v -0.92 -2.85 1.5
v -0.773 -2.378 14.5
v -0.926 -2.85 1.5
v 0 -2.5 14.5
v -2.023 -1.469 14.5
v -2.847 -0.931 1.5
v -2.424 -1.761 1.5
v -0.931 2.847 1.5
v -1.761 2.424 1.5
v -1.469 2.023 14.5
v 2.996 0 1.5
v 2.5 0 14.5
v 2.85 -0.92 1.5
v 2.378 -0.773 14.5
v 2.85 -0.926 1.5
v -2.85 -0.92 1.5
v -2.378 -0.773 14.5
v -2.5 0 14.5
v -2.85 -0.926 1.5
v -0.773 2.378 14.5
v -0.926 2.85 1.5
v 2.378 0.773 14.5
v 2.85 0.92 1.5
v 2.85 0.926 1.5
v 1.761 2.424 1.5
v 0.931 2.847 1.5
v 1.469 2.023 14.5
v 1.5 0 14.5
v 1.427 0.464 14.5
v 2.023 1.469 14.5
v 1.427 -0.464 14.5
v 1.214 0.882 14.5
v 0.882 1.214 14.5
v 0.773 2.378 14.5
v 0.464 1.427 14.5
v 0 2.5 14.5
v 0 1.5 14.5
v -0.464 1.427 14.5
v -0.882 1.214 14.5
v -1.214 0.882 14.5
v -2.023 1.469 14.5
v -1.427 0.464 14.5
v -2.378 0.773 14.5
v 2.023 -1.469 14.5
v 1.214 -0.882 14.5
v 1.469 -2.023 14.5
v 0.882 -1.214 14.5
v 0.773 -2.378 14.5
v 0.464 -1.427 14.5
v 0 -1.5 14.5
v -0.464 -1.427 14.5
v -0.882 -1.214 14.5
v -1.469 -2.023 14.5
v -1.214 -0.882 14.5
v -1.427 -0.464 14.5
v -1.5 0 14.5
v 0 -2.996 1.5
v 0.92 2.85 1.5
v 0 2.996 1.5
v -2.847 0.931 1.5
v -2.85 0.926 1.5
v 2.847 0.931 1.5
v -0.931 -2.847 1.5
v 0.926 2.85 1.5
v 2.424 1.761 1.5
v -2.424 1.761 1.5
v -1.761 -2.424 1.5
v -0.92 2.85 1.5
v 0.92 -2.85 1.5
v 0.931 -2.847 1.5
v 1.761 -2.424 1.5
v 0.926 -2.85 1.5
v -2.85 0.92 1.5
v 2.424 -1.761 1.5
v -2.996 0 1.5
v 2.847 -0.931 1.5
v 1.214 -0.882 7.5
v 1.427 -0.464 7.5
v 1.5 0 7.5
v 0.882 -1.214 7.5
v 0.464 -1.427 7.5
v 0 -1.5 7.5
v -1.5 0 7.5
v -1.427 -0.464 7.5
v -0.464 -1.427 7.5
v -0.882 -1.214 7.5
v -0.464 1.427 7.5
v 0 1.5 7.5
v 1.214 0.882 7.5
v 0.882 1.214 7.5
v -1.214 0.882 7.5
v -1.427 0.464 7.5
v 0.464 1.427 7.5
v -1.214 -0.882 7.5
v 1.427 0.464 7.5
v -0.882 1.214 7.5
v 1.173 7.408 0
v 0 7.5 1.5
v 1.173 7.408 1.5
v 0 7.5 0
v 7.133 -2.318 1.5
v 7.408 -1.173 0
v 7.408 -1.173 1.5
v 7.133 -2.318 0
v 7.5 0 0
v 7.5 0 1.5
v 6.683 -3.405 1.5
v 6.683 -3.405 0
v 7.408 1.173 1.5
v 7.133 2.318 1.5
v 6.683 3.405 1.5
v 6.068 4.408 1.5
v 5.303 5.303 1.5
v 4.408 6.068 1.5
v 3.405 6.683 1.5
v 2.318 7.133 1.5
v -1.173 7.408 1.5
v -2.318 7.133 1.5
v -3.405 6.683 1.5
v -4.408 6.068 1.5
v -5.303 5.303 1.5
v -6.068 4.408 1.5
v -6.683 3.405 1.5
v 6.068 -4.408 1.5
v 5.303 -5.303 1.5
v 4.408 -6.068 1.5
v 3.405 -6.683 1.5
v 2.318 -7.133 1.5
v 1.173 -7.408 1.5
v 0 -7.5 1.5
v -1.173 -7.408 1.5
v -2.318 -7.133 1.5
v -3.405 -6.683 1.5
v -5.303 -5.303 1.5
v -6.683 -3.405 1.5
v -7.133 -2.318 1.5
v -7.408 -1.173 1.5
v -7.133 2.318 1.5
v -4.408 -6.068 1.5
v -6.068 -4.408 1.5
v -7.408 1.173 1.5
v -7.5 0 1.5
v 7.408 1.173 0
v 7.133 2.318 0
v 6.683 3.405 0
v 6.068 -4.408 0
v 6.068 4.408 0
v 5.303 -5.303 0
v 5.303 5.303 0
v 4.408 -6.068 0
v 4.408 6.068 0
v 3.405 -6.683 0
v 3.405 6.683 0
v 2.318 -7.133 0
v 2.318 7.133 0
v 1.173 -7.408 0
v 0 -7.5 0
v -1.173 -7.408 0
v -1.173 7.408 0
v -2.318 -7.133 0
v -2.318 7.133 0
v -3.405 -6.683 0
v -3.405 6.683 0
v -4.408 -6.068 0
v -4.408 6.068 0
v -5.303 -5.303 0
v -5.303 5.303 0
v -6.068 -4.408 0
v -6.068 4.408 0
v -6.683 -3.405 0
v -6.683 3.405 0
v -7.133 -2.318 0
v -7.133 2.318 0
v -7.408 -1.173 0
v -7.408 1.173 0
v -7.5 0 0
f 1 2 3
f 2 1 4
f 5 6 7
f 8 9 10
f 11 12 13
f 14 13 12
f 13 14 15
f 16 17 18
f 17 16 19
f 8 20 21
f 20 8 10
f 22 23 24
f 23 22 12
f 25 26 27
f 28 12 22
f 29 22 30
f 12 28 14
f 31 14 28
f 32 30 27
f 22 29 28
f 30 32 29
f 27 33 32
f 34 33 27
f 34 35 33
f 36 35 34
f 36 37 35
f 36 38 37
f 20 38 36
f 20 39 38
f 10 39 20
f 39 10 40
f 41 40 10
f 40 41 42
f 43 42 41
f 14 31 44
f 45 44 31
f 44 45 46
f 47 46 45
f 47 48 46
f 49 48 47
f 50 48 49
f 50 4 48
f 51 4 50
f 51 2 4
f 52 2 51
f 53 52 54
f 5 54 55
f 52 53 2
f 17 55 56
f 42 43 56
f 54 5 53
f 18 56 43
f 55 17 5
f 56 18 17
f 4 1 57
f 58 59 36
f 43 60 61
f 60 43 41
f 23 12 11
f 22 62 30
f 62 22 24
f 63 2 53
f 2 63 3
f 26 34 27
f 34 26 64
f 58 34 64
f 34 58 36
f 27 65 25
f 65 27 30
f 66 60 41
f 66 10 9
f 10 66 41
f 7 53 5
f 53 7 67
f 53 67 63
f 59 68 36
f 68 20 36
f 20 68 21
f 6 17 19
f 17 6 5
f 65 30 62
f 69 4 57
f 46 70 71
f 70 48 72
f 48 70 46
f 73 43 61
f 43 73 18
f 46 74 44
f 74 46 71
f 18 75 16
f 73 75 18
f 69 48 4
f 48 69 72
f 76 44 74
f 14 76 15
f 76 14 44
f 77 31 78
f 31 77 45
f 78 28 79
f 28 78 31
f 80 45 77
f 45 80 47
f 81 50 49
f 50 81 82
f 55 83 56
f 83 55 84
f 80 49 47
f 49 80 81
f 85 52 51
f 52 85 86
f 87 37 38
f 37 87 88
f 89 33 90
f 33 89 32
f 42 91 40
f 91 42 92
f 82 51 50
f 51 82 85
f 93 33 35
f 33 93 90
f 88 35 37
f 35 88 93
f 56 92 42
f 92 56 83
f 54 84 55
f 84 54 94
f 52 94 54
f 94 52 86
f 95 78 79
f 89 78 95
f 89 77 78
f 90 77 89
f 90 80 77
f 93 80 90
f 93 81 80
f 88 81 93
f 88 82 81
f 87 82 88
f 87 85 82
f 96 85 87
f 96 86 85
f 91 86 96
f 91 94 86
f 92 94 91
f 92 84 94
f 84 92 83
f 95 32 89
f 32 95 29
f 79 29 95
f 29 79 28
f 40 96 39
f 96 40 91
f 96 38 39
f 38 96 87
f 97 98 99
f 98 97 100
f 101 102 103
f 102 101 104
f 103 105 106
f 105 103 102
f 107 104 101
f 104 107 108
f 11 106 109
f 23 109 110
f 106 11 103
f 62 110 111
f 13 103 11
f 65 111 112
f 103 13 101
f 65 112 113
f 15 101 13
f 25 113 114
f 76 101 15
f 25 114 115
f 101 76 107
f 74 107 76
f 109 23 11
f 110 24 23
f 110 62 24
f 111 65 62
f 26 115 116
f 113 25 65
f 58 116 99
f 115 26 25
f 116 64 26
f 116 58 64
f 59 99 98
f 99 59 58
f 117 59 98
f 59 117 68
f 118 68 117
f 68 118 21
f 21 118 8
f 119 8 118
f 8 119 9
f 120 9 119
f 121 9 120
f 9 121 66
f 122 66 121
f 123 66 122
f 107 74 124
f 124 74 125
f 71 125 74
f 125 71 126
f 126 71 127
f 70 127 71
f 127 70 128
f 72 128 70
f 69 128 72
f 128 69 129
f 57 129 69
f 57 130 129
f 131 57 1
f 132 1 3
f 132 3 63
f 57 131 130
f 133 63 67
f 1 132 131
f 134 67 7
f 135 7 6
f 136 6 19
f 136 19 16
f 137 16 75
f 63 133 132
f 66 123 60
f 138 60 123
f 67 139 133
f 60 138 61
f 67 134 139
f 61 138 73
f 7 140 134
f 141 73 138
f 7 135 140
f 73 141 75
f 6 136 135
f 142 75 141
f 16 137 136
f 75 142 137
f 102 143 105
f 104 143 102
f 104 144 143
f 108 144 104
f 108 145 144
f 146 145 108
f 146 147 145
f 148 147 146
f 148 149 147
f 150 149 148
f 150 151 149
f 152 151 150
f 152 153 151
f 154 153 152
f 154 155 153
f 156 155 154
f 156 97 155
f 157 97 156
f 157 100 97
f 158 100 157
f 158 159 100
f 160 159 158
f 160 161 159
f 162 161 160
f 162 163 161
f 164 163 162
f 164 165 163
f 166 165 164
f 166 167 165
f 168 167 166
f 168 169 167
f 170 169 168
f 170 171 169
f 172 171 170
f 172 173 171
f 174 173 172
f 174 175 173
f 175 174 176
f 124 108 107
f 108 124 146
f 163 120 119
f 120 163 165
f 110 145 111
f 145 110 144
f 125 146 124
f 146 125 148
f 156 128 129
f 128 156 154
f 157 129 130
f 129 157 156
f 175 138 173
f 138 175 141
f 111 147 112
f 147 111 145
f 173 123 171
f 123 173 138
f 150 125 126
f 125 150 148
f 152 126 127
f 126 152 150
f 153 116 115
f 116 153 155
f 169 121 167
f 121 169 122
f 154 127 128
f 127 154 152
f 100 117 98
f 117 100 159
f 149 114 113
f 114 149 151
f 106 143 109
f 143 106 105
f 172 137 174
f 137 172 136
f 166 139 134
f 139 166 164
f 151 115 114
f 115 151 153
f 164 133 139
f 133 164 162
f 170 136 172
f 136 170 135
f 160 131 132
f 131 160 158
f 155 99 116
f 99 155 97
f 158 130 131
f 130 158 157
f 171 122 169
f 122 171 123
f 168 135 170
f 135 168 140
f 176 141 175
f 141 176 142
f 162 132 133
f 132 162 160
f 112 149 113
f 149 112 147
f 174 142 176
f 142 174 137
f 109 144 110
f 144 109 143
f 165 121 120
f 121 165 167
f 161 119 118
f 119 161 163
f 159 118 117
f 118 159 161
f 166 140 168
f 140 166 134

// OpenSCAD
axle_inner_diam = 3.0;
axle_outer_diam = 5;
axle_outer_top_diam = 6;
axle_length = 13;

top_diam = 15;
top_thickness = 1.5;
top_washer_diam = 12;
top_washer_thickness = 0.5;

module corn_holder() {
	render() difference() {
		cylinder(d1=axle_outer_diam, d2=axle_outer_top_diam, h=axle_length+0.1, $fn=20);
		cylinder(d=axle_inner_diam, h=7, $fn=20); 
	}
	translate([0 , 0, axle_length]) { 
		render() difference() {
			cylinder(d=top_diam, h=top_thickness,$fn=40);
			//translate([0,0,top_thickness-top_washer_thickness]) cylinder(d=top_washer_diam, h=top_washer_thickness,$fn=40);
		}
	}
}

rotate([180,0,0]) translate([0,0,-axle_length-top_thickness]) corn_holder();
